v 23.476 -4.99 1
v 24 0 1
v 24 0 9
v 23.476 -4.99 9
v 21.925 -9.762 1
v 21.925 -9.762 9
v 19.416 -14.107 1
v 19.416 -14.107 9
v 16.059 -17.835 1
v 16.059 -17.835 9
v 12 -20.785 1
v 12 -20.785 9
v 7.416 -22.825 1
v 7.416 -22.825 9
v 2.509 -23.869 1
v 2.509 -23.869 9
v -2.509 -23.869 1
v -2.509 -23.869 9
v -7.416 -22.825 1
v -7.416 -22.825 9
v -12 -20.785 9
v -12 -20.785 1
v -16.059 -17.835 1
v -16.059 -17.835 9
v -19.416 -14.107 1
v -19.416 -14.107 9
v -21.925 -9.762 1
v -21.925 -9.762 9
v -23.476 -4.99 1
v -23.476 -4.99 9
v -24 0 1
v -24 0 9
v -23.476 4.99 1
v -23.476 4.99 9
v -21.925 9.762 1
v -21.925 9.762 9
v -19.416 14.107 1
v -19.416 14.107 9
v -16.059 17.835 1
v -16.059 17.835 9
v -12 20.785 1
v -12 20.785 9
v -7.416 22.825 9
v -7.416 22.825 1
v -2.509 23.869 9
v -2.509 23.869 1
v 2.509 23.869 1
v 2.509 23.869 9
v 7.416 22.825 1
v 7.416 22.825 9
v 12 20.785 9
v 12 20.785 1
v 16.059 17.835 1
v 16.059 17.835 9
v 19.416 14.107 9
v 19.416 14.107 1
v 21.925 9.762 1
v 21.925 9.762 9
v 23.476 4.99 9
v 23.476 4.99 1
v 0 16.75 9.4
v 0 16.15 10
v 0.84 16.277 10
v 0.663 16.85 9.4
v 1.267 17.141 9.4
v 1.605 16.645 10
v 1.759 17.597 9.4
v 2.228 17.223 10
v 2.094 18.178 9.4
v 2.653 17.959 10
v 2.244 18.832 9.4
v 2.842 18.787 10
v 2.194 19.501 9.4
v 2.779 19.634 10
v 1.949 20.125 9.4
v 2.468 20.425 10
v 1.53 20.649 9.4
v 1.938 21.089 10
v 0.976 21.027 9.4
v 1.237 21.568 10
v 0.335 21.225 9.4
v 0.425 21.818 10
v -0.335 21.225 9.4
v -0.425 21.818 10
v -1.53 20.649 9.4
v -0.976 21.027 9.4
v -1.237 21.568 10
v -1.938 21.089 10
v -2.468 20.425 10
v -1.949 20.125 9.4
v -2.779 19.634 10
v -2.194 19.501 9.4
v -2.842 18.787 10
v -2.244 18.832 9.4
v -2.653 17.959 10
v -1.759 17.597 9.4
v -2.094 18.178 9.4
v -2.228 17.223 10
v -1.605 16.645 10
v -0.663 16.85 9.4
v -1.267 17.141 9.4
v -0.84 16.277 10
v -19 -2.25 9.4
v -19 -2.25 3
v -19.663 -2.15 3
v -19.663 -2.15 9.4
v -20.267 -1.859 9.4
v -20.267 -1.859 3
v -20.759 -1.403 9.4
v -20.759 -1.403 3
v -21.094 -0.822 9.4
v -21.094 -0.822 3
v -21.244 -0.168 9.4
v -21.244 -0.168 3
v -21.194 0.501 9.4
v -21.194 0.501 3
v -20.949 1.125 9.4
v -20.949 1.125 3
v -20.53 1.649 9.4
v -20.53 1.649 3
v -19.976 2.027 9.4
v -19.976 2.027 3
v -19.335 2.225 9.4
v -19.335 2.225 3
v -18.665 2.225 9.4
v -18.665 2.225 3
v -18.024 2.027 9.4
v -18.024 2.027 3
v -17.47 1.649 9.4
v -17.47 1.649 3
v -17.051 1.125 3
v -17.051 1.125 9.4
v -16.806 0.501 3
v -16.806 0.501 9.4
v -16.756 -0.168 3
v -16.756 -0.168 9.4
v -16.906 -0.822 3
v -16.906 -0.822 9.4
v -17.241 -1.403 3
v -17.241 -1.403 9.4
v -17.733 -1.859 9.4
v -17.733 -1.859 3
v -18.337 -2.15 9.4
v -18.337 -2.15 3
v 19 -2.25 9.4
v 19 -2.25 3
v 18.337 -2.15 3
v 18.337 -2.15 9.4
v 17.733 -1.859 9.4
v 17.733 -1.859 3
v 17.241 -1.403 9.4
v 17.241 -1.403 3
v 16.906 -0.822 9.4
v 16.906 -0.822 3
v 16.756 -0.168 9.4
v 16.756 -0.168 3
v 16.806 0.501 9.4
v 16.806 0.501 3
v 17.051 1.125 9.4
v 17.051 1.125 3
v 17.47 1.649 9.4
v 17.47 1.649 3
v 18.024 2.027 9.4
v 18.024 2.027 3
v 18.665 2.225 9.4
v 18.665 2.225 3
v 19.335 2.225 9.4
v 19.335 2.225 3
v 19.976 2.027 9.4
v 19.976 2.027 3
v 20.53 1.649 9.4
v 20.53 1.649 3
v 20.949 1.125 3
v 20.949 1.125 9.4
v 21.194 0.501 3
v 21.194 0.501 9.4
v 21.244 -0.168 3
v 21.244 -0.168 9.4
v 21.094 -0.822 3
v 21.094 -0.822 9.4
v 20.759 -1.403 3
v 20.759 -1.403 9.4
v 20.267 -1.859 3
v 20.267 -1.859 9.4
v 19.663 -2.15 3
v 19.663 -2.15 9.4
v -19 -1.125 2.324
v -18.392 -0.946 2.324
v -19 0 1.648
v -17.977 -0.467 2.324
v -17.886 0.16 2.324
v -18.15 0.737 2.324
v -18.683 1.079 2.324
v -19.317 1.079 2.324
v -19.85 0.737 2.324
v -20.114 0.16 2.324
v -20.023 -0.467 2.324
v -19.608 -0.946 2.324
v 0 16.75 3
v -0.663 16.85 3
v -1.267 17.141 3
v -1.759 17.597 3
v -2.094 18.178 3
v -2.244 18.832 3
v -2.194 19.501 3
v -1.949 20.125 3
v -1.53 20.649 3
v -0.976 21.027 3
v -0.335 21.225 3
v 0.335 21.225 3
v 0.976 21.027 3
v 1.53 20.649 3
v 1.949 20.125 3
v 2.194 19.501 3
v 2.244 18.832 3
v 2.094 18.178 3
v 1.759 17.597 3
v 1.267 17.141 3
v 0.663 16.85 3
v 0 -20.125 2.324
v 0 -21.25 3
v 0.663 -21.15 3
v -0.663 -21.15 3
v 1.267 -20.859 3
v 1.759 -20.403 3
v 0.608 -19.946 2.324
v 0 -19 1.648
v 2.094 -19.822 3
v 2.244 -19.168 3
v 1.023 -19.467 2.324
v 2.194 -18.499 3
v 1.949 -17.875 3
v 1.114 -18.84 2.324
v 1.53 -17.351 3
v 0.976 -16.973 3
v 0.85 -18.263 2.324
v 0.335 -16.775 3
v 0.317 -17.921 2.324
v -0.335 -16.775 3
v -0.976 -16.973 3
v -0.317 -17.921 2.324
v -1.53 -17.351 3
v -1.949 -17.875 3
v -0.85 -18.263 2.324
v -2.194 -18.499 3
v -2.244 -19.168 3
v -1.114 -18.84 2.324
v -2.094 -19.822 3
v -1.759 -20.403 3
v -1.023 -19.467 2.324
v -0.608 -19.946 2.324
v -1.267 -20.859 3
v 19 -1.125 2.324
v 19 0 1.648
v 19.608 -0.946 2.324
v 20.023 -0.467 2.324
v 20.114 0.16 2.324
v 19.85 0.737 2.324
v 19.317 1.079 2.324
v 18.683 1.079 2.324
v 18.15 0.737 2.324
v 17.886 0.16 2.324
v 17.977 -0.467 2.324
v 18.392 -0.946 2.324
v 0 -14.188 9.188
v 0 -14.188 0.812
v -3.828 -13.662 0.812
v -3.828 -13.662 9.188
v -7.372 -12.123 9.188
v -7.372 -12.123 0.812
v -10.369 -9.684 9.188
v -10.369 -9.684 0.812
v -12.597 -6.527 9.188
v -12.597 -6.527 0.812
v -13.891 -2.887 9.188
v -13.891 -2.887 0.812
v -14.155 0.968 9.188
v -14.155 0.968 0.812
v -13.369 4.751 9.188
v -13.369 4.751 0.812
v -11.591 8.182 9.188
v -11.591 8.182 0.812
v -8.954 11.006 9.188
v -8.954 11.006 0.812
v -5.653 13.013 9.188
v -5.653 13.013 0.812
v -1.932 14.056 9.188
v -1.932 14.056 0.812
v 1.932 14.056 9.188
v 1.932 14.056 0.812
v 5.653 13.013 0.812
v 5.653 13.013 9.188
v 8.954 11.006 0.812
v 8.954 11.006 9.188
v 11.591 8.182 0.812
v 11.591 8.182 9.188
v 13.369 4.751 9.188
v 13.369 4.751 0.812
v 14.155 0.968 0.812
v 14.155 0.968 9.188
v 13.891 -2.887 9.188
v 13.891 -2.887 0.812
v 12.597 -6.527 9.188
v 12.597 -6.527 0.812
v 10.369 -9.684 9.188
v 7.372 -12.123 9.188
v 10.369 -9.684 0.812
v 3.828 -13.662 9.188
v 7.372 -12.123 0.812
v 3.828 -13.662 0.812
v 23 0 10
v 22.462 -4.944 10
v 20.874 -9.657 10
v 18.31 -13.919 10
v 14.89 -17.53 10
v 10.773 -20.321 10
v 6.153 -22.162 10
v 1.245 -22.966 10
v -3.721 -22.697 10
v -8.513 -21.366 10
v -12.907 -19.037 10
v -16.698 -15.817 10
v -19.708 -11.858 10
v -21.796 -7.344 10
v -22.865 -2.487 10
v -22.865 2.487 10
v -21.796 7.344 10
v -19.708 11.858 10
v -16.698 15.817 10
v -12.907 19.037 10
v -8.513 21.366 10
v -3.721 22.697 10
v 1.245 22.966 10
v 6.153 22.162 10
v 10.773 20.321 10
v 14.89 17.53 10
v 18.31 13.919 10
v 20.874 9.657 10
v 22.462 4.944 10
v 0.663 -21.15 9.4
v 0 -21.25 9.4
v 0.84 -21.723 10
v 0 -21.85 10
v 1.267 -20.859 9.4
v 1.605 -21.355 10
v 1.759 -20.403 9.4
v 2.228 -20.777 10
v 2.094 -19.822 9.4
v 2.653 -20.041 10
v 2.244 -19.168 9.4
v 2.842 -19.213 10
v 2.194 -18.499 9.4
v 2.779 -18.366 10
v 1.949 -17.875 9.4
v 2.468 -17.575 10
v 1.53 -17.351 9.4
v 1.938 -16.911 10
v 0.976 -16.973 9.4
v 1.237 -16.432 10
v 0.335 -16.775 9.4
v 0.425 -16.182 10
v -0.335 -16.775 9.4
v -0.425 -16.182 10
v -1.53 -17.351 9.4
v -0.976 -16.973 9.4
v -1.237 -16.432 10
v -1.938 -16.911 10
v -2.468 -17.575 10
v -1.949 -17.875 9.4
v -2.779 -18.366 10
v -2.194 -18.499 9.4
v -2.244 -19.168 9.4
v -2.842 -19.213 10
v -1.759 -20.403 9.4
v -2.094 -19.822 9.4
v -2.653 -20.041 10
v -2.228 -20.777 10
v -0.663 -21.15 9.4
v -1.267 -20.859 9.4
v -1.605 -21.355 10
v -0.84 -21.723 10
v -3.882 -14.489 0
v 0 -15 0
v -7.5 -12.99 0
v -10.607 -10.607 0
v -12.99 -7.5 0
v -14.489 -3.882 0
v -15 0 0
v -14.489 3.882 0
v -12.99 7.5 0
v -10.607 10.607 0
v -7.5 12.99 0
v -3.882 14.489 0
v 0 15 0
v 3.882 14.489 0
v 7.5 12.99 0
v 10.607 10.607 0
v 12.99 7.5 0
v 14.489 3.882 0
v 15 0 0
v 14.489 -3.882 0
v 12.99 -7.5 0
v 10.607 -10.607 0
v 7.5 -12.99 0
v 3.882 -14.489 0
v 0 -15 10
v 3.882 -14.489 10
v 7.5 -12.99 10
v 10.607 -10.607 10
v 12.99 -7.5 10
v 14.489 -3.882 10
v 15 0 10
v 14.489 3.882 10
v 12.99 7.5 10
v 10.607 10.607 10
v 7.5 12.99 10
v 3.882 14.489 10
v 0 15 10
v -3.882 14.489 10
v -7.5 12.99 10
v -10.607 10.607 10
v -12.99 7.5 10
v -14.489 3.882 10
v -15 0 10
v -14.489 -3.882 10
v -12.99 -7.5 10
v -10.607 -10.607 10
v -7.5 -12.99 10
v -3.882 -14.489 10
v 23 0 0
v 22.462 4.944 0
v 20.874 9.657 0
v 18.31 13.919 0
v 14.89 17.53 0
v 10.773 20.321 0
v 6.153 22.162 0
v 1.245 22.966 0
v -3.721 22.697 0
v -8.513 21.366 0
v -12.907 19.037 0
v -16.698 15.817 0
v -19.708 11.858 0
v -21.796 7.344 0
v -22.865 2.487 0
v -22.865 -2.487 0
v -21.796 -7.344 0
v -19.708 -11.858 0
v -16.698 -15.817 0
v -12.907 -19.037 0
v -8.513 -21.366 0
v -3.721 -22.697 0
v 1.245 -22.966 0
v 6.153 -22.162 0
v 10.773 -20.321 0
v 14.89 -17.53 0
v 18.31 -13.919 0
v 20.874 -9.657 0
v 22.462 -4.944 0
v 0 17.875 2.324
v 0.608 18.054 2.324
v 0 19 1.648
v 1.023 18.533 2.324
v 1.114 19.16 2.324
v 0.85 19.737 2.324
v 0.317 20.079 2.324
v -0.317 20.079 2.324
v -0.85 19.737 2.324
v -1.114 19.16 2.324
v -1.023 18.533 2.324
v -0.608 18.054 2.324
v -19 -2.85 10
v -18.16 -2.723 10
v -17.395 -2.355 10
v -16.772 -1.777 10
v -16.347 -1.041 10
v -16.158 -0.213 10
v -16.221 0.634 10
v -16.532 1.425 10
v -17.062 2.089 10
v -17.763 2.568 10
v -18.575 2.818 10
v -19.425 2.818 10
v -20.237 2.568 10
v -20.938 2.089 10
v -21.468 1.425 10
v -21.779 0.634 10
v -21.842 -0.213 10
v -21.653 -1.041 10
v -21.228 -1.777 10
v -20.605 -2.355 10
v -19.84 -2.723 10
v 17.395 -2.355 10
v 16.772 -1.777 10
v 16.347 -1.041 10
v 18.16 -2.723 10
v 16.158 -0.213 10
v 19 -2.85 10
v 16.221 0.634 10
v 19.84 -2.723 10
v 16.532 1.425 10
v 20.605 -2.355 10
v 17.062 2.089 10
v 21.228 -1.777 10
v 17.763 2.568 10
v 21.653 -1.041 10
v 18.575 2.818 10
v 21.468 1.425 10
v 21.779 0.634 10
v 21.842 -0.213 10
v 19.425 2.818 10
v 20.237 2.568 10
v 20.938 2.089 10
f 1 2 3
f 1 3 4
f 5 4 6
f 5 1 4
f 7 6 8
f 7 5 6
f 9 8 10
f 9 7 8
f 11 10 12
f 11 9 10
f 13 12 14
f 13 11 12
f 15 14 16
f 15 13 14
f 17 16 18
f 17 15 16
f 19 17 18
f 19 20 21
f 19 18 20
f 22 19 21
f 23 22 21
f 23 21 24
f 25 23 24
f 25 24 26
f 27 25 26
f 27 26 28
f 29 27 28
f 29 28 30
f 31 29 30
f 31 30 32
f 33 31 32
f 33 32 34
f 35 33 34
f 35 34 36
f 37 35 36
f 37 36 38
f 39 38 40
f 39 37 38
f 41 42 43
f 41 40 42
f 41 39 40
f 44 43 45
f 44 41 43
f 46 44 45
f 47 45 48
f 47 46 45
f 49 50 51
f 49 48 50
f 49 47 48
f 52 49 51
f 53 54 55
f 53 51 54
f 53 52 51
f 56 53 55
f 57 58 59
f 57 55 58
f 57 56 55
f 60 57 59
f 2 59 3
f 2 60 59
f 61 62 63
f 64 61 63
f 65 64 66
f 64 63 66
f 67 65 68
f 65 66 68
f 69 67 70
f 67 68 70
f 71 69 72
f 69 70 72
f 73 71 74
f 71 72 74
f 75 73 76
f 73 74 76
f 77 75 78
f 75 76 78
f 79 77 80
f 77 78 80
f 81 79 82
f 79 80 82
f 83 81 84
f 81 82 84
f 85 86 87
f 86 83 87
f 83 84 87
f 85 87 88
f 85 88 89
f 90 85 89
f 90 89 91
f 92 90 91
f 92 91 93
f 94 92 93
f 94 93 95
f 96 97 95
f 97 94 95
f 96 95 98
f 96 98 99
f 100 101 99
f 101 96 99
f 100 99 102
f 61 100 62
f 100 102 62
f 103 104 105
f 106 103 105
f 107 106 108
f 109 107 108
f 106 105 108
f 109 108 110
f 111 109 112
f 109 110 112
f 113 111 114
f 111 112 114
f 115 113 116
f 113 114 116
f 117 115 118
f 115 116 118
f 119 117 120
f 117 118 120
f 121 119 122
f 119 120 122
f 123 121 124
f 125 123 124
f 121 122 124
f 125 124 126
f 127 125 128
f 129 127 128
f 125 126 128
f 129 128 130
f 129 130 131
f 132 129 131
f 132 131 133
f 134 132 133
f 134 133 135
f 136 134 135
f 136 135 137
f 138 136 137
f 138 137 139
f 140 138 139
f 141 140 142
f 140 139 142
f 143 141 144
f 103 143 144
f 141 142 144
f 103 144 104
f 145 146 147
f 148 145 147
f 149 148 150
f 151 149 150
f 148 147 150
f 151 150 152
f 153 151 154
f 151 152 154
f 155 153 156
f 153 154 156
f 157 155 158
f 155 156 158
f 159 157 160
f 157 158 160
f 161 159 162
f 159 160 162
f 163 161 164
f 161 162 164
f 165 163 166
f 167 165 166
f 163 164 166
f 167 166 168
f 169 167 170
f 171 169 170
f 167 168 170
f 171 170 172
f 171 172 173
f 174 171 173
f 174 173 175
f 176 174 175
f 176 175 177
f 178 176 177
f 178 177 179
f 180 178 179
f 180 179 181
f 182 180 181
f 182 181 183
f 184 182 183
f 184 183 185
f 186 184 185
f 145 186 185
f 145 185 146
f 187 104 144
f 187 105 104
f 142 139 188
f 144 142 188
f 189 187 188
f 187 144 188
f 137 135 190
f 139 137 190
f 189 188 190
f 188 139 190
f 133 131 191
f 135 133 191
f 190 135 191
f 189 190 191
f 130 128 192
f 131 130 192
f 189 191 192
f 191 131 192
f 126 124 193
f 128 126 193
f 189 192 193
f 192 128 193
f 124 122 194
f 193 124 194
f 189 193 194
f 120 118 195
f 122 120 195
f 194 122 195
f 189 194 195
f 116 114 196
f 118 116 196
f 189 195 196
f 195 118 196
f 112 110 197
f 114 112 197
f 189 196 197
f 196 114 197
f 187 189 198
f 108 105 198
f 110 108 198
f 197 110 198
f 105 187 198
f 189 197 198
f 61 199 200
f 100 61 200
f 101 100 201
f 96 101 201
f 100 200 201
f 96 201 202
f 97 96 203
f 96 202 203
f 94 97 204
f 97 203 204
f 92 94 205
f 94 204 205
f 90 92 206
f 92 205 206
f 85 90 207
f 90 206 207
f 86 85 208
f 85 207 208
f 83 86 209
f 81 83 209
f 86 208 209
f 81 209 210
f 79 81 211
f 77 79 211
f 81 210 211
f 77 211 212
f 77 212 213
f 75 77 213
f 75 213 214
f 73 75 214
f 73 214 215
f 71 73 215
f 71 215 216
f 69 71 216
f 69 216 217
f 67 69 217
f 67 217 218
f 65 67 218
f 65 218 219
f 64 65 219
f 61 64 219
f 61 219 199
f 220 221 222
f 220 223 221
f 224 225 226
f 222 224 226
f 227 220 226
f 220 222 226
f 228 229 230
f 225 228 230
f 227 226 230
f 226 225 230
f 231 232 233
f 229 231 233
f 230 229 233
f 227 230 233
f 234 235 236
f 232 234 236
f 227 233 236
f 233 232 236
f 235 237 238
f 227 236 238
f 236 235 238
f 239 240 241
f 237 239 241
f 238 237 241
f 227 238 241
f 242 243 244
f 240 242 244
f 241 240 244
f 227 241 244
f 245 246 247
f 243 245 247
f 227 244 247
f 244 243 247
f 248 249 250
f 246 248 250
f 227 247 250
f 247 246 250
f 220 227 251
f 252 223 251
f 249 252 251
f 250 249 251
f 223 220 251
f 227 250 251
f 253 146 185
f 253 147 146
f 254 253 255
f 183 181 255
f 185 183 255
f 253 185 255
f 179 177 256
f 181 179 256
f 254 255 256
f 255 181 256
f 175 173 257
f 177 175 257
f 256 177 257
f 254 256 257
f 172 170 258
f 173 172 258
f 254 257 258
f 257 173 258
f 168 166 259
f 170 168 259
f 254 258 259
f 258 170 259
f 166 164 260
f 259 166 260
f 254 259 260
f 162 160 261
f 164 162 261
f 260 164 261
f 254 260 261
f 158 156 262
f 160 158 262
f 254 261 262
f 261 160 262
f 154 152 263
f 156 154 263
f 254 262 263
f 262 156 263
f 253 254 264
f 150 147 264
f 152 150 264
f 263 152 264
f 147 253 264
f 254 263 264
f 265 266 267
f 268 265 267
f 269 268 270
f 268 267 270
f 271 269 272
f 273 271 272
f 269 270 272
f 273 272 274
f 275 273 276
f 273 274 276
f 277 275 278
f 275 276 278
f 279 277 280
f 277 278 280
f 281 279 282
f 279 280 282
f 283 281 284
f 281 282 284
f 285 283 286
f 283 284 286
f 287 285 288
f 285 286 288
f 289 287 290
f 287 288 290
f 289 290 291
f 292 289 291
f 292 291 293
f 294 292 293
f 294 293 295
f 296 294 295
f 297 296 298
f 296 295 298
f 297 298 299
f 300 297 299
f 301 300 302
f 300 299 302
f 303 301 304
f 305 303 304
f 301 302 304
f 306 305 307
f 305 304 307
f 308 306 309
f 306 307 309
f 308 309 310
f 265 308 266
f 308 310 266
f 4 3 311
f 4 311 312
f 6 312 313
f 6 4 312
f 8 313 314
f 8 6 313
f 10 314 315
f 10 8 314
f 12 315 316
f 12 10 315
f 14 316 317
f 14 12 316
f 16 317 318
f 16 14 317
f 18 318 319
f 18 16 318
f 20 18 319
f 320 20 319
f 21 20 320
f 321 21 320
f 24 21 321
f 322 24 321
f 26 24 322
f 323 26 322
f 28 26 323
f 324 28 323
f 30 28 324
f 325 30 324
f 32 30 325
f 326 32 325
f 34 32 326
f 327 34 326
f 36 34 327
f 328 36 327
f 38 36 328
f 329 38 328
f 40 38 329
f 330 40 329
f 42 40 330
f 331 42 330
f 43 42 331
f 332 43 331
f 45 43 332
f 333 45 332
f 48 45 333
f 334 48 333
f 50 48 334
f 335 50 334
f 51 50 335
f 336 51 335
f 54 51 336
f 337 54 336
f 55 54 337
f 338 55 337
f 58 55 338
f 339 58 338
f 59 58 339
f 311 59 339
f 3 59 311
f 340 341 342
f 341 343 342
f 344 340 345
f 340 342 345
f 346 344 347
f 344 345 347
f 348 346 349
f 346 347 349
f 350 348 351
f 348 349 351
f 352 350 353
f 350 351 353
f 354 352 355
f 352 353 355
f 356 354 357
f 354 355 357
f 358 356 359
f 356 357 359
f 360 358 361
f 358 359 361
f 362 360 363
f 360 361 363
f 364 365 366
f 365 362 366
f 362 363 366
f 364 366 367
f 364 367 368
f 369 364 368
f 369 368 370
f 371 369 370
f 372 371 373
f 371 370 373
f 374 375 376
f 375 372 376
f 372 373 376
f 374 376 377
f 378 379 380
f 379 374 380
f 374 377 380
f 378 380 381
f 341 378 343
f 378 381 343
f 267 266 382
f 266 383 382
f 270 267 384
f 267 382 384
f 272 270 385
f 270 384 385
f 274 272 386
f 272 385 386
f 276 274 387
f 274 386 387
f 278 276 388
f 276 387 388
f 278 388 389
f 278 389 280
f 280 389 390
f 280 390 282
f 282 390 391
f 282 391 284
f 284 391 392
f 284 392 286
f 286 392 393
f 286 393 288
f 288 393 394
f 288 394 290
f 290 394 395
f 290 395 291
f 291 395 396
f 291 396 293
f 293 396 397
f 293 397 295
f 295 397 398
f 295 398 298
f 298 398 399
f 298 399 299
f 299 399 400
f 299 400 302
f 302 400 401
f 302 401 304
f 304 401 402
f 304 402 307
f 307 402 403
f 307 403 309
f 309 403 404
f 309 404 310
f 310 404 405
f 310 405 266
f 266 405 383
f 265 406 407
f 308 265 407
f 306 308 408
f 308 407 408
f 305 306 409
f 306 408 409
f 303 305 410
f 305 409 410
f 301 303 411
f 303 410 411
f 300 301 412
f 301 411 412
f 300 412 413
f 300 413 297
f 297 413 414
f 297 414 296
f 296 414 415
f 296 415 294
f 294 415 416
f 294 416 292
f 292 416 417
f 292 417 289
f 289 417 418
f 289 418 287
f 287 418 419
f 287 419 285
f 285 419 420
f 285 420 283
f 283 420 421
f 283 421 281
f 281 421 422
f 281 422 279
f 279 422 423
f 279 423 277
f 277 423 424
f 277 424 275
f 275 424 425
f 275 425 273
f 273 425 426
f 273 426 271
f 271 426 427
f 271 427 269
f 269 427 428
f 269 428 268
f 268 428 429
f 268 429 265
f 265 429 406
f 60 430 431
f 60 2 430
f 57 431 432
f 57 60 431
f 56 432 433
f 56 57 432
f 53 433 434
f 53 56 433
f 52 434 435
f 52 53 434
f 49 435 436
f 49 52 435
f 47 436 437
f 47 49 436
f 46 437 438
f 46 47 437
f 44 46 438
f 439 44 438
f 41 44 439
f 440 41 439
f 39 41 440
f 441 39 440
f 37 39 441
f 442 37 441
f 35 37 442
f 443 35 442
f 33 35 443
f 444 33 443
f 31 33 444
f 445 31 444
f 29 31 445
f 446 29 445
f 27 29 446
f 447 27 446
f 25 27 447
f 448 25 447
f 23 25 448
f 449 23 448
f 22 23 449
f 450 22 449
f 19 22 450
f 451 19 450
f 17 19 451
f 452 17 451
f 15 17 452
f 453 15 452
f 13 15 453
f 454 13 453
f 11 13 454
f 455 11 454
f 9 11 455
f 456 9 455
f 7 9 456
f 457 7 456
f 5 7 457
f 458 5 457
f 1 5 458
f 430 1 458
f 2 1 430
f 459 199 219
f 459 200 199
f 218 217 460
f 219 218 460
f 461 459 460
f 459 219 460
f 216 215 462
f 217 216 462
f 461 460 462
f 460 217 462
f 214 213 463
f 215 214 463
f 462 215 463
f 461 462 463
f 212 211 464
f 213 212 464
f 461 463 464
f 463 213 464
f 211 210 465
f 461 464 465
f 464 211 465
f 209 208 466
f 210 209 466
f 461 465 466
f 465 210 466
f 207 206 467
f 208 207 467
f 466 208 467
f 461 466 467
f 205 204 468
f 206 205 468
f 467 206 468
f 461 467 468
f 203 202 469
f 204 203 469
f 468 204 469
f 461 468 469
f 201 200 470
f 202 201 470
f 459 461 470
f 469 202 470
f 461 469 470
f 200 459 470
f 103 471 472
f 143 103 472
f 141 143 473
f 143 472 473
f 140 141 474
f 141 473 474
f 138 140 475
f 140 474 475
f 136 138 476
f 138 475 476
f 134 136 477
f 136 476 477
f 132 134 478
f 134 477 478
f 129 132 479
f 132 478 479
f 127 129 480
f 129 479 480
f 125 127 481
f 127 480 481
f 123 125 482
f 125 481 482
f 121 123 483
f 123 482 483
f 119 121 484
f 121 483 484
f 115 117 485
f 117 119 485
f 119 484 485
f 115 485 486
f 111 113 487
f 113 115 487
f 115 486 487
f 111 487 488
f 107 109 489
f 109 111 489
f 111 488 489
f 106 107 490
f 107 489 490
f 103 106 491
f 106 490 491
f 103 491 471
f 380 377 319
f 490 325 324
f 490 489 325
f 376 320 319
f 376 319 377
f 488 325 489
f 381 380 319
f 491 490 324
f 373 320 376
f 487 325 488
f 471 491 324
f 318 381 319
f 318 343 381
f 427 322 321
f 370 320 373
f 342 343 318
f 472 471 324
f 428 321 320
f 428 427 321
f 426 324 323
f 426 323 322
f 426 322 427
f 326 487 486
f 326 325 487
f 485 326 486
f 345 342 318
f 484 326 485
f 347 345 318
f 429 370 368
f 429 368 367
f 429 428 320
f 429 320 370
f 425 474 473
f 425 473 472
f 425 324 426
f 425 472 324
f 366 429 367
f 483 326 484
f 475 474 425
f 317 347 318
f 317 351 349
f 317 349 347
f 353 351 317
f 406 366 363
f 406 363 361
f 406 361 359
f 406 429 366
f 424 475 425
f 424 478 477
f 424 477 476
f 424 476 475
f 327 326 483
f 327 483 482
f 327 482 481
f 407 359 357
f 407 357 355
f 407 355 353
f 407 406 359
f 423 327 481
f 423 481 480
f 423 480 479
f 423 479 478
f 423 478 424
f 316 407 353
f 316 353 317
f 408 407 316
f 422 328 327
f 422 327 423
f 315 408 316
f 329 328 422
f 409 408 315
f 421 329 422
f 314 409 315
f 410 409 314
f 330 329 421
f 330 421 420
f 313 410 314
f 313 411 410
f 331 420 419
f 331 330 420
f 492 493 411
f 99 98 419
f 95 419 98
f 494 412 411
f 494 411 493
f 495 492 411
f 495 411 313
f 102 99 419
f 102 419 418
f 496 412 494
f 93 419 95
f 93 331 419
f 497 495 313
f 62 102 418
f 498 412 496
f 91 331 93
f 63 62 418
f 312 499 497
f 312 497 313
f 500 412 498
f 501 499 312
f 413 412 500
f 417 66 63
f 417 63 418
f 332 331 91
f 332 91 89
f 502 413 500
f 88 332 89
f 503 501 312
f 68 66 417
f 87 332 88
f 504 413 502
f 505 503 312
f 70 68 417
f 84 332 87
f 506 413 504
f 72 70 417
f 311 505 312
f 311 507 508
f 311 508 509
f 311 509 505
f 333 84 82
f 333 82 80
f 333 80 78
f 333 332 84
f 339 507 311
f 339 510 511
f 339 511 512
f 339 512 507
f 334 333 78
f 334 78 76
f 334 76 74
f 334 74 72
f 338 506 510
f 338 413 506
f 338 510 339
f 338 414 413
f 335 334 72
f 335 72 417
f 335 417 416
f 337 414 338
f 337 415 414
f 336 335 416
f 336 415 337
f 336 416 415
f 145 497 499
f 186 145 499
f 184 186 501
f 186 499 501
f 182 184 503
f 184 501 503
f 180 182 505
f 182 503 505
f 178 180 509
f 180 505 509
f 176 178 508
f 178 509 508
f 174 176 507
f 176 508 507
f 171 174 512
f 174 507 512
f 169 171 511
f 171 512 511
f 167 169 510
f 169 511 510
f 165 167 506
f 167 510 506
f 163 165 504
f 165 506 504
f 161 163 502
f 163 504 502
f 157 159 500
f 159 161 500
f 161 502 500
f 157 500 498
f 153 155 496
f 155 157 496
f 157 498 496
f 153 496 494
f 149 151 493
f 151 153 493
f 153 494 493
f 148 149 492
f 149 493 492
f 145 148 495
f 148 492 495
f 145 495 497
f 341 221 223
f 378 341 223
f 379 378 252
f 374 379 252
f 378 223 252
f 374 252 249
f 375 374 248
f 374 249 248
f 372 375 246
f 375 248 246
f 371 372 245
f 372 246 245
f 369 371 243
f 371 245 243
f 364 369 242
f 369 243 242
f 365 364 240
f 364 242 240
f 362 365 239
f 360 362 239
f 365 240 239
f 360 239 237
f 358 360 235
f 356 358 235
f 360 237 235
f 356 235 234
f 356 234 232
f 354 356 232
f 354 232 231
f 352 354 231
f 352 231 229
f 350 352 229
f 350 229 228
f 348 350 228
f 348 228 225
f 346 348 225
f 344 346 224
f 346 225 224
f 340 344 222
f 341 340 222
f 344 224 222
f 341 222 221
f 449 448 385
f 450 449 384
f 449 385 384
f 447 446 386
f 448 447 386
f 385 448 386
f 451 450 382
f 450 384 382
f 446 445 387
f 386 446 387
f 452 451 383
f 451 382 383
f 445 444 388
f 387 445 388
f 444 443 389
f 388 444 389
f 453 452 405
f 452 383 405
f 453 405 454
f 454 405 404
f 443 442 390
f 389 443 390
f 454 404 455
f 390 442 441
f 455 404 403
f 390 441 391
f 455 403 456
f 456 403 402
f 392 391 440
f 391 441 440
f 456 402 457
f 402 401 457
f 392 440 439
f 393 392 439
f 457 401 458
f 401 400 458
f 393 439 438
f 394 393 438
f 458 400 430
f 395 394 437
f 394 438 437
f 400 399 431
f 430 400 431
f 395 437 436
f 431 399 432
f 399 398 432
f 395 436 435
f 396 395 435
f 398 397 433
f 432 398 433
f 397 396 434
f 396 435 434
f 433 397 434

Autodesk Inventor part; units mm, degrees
ref_plane "YZ Plane" through (0, 0, 0) normal (1, 0, 0) x (0, 1, 0)
ref_plane "XZ Plane" through (0, 0, 0) normal (0, 1, 0) x (-1, 0, 0)
ref_plane "XY Plane" through (0, 0, 0) normal (0, 0, 1) x (1, 0, 0)
sketch "Sketch1" plane through (0, 0, 0) normal (0, 0, 1) x (1, 0, 0)
  line L0 (-33.6, 0) -> (33.6, 0) construction
  line L1 (0, -33.6) -> (0, 33.6) construction
  circle A0 centre (0, 0) radius 24
  dimension "d0" = 48
extrude "Выдавливание1" add sketch "Sketch1" along normal blind 10
hole "Отверстие1" at (0, 0, 10) direction (0, 0, -1) diameter 28.376 end through all thread size "M30x1.5" class "6H" standard "ISO Metric profile"
sketch "Sketch2" plane through (0, 0, 10) normal (0, 0, 1) x (1, 0, 0)
  circle A0 centre (0, 0) radius 24 projected
  circle A1 centre (0, 0) radius 19 construction
  line L0 (-33.6, 0) -> (33.6, 0) construction
  line L1 (0, -33.6) -> (0, 33.6) construction
  point P0 (-19, 0)
  point P1 (0, 19)
  point P2 (19, 0)
  point P3 (0, -19)
  dimension "d13" = 38
hole "Отверстие2" at (-19, 0, 10) at (0, 19, 10) at (19, 0, 10) at (0, -19, 10) direction (0, 0, -1) diameter 4.5 depth 7 tip angle 118
chamfer "Фаска1" distance 0.6 angle 45 4 edges at (0, -16.75, 10) (-19, 2.25, 10) (19, 2.25, 10) (0, 21.25, 10)
chamfer "Фаска2" distance 1 angle 45 2 edges at (-24, 0, 10) (-24, 0, 0)
sketch "Sketch3" plane through (0, 0, 0) normal (1, 0, 0) x (0, 1, 0)
  line L0 (-14.188, 0) -> (-14.188, 10) construction
  line L1 (14.188, 0) -> (14.188, 10) construction
  line L2 (-15, 10) -> (0, -5)
  line L3 (-15, 10) -> (0, 10)
  line L4 (0, 10) -> (0, -5)
  line L5 (0, -9) -> (0, 19) construction
  line L6 (-15.6074, 5) -> (15.0846, 5) construction
  line L7 (-21.7458, 0) -> (21.223, 0) construction
  line L8 (-15, 0) -> (0, 15)
  line L9 (-15, 0) -> (0, 0)
  line L10 (0, 0) -> (0, 15)
  point P0 (14.188, 5)
  dimension "d30" = 10
  dimension "d31" = 30
  dimension "d32" = 45
  dimension "d34" = 5
revolve "Вращение1" cut sketch "Sketch3" angle 360 about axis through (0, 0, -10) along (0, 0, 1)
equation "\"d0\" = D_L"
equation "\"d2\" = m_"
equation "\"d13\" = D_x"
equation "\"d14\" = d1"
equation "\"d16\" = d1"
equation "\"d19\" = h_"
equation "\"d21\" = c1"
equation "\"d24\" = c_"
equation "\"d30\" = m_"
equation "\"d31\" = d_"
equation "\"d34\" = 0.5 * m_"
equation "\"d_\" = 30"
equation "\"D_L\" = 48"
equation "\"D_x\" = 38"
equation "\"d1\" = 4.5"
equation "\"m_\" = 10"
equation "\"h_\" = 7"
equation "\"c_\" = 1"
equation "\"c1\" = 0.6"
properties part number "Гайка M30x1.5 6H ГОСТ 6393-73" material "Сталь, мягкая"
